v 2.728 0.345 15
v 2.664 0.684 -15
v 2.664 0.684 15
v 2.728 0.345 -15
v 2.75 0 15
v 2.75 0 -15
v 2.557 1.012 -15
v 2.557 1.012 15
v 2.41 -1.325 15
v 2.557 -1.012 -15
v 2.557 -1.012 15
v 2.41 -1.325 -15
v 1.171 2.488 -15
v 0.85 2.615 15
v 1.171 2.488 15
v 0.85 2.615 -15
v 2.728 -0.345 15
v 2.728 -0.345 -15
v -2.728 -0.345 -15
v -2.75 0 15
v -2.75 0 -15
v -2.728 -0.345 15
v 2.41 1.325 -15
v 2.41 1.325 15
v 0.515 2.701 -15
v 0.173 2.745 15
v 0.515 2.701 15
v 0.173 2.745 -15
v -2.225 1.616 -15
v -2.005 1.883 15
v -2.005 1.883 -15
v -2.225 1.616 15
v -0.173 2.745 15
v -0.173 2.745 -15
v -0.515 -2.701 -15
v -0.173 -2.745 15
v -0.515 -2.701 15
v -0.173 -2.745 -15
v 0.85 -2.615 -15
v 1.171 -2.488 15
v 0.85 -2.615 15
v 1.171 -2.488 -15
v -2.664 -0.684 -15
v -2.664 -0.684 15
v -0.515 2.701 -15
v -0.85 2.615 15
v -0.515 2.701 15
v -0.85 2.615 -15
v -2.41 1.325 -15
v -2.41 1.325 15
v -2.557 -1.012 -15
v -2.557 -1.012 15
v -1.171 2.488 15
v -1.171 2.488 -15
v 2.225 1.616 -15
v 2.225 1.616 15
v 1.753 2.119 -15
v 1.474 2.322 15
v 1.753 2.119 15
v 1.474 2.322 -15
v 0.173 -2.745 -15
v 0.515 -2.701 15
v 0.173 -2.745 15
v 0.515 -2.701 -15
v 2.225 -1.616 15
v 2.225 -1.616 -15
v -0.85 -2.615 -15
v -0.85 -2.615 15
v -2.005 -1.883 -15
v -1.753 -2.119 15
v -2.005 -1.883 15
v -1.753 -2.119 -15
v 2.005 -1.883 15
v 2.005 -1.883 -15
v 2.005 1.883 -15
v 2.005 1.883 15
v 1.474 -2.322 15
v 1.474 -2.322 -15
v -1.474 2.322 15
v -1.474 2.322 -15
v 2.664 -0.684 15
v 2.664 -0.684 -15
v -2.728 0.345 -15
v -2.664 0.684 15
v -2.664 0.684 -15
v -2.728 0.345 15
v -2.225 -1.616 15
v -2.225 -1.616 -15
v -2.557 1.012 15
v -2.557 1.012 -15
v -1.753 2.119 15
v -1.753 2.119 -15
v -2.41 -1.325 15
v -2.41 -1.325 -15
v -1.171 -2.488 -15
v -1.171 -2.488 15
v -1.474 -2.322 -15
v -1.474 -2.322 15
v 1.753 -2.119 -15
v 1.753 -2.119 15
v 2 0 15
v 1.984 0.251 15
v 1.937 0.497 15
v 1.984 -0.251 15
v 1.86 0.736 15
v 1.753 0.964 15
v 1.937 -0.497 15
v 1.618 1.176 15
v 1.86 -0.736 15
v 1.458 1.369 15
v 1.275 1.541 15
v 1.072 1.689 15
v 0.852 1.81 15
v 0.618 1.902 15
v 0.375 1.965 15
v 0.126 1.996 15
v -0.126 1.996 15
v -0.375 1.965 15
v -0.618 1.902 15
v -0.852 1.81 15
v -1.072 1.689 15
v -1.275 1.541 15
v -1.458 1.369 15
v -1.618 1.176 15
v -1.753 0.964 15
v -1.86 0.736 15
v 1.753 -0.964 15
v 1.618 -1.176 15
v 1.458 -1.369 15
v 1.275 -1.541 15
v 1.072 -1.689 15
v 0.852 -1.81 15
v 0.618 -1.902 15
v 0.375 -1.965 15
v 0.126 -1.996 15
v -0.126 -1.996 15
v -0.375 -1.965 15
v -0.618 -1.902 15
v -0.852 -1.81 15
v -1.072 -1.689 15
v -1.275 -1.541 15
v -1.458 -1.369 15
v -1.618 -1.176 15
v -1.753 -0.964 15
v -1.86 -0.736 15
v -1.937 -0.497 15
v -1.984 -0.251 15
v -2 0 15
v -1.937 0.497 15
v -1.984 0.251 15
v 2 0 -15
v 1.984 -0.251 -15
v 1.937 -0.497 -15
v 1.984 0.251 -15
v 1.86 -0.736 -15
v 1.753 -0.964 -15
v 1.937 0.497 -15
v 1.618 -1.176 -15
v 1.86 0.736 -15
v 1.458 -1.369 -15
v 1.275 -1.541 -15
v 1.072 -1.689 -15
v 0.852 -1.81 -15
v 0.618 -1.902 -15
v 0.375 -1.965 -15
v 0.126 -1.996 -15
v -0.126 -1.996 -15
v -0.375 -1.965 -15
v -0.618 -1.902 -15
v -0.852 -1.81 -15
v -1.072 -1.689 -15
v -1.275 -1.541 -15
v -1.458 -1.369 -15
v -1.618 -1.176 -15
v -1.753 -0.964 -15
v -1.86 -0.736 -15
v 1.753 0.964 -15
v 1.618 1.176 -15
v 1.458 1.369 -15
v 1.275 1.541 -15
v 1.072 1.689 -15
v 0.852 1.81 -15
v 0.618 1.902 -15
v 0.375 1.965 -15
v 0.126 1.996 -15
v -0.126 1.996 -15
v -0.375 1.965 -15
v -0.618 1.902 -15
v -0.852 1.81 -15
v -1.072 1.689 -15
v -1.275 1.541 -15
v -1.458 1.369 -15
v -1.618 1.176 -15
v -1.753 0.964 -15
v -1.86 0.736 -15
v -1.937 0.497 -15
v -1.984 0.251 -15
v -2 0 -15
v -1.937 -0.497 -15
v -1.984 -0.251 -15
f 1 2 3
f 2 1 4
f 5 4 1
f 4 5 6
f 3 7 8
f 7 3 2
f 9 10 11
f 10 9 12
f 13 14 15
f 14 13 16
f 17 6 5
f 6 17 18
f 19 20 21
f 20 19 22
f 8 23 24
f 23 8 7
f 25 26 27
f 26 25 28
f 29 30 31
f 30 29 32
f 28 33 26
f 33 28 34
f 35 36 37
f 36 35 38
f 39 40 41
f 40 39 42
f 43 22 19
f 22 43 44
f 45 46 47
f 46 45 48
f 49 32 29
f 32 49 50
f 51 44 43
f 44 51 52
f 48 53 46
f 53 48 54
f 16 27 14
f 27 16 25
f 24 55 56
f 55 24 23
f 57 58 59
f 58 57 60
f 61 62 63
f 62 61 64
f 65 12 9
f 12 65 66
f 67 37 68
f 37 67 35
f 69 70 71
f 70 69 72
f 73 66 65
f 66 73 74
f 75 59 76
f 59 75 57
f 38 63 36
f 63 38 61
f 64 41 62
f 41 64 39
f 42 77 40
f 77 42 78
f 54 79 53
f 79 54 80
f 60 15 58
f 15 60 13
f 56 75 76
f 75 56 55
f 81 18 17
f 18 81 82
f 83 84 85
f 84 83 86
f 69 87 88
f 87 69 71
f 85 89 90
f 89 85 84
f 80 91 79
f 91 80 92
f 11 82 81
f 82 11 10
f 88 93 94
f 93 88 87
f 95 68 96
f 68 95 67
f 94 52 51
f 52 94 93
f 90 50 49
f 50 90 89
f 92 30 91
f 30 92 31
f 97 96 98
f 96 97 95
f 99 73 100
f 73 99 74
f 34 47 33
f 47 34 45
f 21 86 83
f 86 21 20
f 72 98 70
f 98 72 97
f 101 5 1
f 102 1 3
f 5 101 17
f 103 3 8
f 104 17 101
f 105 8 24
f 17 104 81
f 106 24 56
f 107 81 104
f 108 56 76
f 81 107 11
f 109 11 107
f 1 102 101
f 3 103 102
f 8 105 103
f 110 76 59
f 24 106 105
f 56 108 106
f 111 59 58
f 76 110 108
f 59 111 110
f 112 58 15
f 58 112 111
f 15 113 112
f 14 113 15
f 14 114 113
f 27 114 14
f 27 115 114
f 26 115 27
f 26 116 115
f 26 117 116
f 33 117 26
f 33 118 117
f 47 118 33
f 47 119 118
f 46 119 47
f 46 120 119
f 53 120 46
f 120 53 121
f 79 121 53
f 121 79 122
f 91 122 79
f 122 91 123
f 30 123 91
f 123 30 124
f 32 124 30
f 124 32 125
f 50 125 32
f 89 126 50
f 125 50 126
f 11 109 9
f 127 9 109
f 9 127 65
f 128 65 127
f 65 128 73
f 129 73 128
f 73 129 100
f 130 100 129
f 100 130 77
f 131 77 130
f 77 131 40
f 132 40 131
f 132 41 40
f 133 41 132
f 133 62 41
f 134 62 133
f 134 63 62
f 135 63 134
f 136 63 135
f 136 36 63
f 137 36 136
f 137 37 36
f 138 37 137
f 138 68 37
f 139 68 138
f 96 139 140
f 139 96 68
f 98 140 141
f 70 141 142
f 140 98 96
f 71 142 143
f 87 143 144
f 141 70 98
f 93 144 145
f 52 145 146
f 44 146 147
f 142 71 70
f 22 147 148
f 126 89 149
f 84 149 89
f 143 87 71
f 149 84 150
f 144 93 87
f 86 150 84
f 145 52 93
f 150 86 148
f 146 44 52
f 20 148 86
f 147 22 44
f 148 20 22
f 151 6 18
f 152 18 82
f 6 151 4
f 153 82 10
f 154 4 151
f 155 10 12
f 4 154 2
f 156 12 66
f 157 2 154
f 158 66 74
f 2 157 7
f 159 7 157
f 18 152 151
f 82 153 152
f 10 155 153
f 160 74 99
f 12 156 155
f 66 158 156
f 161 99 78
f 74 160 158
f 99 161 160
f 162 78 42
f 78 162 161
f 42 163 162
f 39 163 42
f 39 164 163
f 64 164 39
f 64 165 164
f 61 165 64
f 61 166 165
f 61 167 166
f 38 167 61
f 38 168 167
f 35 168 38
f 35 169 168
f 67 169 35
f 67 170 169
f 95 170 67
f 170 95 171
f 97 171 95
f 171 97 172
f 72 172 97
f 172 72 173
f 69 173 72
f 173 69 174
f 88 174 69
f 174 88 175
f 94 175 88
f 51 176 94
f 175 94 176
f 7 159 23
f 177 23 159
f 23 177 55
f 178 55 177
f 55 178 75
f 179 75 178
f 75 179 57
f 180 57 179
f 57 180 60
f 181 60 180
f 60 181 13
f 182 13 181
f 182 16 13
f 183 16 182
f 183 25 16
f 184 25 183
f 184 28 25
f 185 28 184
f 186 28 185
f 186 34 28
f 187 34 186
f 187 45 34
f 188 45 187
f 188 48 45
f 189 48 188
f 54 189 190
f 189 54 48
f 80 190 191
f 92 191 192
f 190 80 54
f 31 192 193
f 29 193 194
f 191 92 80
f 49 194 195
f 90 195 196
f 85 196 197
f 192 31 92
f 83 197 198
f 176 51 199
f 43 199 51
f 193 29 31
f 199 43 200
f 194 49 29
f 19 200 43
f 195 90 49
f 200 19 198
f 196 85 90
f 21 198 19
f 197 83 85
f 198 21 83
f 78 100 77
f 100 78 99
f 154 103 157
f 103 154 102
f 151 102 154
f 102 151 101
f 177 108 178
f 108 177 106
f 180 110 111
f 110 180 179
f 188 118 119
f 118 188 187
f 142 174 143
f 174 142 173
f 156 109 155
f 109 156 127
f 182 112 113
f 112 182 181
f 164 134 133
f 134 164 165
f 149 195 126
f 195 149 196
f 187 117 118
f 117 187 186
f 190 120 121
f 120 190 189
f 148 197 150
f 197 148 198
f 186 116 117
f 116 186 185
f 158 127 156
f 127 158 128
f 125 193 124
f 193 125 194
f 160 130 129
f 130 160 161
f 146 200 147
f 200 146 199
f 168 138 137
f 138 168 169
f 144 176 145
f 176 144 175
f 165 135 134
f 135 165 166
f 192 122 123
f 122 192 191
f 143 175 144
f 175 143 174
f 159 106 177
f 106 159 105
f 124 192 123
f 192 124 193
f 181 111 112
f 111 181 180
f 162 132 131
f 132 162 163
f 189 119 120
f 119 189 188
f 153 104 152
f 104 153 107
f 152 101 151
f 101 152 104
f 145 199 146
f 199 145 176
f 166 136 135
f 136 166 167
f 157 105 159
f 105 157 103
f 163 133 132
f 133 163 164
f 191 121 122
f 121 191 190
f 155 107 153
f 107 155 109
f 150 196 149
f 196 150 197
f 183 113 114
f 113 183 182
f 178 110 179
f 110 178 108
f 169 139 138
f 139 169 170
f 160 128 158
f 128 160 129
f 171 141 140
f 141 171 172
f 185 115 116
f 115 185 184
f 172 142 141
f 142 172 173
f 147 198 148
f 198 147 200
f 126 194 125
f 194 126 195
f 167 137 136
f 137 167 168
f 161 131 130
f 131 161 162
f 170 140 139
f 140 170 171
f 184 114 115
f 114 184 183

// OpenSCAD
$fn = 50;


difference() {
	union() {
		translate(v = [0, 0, -15.0000000000]) {
			cylinder(h = 30, r = 2.7500000000);
		}
	}
	union() {
		translate(v = [0, 0, -100.0000000000]) {
			cylinder(h = 200, r = 2.0000000000);
		}
	}
}
